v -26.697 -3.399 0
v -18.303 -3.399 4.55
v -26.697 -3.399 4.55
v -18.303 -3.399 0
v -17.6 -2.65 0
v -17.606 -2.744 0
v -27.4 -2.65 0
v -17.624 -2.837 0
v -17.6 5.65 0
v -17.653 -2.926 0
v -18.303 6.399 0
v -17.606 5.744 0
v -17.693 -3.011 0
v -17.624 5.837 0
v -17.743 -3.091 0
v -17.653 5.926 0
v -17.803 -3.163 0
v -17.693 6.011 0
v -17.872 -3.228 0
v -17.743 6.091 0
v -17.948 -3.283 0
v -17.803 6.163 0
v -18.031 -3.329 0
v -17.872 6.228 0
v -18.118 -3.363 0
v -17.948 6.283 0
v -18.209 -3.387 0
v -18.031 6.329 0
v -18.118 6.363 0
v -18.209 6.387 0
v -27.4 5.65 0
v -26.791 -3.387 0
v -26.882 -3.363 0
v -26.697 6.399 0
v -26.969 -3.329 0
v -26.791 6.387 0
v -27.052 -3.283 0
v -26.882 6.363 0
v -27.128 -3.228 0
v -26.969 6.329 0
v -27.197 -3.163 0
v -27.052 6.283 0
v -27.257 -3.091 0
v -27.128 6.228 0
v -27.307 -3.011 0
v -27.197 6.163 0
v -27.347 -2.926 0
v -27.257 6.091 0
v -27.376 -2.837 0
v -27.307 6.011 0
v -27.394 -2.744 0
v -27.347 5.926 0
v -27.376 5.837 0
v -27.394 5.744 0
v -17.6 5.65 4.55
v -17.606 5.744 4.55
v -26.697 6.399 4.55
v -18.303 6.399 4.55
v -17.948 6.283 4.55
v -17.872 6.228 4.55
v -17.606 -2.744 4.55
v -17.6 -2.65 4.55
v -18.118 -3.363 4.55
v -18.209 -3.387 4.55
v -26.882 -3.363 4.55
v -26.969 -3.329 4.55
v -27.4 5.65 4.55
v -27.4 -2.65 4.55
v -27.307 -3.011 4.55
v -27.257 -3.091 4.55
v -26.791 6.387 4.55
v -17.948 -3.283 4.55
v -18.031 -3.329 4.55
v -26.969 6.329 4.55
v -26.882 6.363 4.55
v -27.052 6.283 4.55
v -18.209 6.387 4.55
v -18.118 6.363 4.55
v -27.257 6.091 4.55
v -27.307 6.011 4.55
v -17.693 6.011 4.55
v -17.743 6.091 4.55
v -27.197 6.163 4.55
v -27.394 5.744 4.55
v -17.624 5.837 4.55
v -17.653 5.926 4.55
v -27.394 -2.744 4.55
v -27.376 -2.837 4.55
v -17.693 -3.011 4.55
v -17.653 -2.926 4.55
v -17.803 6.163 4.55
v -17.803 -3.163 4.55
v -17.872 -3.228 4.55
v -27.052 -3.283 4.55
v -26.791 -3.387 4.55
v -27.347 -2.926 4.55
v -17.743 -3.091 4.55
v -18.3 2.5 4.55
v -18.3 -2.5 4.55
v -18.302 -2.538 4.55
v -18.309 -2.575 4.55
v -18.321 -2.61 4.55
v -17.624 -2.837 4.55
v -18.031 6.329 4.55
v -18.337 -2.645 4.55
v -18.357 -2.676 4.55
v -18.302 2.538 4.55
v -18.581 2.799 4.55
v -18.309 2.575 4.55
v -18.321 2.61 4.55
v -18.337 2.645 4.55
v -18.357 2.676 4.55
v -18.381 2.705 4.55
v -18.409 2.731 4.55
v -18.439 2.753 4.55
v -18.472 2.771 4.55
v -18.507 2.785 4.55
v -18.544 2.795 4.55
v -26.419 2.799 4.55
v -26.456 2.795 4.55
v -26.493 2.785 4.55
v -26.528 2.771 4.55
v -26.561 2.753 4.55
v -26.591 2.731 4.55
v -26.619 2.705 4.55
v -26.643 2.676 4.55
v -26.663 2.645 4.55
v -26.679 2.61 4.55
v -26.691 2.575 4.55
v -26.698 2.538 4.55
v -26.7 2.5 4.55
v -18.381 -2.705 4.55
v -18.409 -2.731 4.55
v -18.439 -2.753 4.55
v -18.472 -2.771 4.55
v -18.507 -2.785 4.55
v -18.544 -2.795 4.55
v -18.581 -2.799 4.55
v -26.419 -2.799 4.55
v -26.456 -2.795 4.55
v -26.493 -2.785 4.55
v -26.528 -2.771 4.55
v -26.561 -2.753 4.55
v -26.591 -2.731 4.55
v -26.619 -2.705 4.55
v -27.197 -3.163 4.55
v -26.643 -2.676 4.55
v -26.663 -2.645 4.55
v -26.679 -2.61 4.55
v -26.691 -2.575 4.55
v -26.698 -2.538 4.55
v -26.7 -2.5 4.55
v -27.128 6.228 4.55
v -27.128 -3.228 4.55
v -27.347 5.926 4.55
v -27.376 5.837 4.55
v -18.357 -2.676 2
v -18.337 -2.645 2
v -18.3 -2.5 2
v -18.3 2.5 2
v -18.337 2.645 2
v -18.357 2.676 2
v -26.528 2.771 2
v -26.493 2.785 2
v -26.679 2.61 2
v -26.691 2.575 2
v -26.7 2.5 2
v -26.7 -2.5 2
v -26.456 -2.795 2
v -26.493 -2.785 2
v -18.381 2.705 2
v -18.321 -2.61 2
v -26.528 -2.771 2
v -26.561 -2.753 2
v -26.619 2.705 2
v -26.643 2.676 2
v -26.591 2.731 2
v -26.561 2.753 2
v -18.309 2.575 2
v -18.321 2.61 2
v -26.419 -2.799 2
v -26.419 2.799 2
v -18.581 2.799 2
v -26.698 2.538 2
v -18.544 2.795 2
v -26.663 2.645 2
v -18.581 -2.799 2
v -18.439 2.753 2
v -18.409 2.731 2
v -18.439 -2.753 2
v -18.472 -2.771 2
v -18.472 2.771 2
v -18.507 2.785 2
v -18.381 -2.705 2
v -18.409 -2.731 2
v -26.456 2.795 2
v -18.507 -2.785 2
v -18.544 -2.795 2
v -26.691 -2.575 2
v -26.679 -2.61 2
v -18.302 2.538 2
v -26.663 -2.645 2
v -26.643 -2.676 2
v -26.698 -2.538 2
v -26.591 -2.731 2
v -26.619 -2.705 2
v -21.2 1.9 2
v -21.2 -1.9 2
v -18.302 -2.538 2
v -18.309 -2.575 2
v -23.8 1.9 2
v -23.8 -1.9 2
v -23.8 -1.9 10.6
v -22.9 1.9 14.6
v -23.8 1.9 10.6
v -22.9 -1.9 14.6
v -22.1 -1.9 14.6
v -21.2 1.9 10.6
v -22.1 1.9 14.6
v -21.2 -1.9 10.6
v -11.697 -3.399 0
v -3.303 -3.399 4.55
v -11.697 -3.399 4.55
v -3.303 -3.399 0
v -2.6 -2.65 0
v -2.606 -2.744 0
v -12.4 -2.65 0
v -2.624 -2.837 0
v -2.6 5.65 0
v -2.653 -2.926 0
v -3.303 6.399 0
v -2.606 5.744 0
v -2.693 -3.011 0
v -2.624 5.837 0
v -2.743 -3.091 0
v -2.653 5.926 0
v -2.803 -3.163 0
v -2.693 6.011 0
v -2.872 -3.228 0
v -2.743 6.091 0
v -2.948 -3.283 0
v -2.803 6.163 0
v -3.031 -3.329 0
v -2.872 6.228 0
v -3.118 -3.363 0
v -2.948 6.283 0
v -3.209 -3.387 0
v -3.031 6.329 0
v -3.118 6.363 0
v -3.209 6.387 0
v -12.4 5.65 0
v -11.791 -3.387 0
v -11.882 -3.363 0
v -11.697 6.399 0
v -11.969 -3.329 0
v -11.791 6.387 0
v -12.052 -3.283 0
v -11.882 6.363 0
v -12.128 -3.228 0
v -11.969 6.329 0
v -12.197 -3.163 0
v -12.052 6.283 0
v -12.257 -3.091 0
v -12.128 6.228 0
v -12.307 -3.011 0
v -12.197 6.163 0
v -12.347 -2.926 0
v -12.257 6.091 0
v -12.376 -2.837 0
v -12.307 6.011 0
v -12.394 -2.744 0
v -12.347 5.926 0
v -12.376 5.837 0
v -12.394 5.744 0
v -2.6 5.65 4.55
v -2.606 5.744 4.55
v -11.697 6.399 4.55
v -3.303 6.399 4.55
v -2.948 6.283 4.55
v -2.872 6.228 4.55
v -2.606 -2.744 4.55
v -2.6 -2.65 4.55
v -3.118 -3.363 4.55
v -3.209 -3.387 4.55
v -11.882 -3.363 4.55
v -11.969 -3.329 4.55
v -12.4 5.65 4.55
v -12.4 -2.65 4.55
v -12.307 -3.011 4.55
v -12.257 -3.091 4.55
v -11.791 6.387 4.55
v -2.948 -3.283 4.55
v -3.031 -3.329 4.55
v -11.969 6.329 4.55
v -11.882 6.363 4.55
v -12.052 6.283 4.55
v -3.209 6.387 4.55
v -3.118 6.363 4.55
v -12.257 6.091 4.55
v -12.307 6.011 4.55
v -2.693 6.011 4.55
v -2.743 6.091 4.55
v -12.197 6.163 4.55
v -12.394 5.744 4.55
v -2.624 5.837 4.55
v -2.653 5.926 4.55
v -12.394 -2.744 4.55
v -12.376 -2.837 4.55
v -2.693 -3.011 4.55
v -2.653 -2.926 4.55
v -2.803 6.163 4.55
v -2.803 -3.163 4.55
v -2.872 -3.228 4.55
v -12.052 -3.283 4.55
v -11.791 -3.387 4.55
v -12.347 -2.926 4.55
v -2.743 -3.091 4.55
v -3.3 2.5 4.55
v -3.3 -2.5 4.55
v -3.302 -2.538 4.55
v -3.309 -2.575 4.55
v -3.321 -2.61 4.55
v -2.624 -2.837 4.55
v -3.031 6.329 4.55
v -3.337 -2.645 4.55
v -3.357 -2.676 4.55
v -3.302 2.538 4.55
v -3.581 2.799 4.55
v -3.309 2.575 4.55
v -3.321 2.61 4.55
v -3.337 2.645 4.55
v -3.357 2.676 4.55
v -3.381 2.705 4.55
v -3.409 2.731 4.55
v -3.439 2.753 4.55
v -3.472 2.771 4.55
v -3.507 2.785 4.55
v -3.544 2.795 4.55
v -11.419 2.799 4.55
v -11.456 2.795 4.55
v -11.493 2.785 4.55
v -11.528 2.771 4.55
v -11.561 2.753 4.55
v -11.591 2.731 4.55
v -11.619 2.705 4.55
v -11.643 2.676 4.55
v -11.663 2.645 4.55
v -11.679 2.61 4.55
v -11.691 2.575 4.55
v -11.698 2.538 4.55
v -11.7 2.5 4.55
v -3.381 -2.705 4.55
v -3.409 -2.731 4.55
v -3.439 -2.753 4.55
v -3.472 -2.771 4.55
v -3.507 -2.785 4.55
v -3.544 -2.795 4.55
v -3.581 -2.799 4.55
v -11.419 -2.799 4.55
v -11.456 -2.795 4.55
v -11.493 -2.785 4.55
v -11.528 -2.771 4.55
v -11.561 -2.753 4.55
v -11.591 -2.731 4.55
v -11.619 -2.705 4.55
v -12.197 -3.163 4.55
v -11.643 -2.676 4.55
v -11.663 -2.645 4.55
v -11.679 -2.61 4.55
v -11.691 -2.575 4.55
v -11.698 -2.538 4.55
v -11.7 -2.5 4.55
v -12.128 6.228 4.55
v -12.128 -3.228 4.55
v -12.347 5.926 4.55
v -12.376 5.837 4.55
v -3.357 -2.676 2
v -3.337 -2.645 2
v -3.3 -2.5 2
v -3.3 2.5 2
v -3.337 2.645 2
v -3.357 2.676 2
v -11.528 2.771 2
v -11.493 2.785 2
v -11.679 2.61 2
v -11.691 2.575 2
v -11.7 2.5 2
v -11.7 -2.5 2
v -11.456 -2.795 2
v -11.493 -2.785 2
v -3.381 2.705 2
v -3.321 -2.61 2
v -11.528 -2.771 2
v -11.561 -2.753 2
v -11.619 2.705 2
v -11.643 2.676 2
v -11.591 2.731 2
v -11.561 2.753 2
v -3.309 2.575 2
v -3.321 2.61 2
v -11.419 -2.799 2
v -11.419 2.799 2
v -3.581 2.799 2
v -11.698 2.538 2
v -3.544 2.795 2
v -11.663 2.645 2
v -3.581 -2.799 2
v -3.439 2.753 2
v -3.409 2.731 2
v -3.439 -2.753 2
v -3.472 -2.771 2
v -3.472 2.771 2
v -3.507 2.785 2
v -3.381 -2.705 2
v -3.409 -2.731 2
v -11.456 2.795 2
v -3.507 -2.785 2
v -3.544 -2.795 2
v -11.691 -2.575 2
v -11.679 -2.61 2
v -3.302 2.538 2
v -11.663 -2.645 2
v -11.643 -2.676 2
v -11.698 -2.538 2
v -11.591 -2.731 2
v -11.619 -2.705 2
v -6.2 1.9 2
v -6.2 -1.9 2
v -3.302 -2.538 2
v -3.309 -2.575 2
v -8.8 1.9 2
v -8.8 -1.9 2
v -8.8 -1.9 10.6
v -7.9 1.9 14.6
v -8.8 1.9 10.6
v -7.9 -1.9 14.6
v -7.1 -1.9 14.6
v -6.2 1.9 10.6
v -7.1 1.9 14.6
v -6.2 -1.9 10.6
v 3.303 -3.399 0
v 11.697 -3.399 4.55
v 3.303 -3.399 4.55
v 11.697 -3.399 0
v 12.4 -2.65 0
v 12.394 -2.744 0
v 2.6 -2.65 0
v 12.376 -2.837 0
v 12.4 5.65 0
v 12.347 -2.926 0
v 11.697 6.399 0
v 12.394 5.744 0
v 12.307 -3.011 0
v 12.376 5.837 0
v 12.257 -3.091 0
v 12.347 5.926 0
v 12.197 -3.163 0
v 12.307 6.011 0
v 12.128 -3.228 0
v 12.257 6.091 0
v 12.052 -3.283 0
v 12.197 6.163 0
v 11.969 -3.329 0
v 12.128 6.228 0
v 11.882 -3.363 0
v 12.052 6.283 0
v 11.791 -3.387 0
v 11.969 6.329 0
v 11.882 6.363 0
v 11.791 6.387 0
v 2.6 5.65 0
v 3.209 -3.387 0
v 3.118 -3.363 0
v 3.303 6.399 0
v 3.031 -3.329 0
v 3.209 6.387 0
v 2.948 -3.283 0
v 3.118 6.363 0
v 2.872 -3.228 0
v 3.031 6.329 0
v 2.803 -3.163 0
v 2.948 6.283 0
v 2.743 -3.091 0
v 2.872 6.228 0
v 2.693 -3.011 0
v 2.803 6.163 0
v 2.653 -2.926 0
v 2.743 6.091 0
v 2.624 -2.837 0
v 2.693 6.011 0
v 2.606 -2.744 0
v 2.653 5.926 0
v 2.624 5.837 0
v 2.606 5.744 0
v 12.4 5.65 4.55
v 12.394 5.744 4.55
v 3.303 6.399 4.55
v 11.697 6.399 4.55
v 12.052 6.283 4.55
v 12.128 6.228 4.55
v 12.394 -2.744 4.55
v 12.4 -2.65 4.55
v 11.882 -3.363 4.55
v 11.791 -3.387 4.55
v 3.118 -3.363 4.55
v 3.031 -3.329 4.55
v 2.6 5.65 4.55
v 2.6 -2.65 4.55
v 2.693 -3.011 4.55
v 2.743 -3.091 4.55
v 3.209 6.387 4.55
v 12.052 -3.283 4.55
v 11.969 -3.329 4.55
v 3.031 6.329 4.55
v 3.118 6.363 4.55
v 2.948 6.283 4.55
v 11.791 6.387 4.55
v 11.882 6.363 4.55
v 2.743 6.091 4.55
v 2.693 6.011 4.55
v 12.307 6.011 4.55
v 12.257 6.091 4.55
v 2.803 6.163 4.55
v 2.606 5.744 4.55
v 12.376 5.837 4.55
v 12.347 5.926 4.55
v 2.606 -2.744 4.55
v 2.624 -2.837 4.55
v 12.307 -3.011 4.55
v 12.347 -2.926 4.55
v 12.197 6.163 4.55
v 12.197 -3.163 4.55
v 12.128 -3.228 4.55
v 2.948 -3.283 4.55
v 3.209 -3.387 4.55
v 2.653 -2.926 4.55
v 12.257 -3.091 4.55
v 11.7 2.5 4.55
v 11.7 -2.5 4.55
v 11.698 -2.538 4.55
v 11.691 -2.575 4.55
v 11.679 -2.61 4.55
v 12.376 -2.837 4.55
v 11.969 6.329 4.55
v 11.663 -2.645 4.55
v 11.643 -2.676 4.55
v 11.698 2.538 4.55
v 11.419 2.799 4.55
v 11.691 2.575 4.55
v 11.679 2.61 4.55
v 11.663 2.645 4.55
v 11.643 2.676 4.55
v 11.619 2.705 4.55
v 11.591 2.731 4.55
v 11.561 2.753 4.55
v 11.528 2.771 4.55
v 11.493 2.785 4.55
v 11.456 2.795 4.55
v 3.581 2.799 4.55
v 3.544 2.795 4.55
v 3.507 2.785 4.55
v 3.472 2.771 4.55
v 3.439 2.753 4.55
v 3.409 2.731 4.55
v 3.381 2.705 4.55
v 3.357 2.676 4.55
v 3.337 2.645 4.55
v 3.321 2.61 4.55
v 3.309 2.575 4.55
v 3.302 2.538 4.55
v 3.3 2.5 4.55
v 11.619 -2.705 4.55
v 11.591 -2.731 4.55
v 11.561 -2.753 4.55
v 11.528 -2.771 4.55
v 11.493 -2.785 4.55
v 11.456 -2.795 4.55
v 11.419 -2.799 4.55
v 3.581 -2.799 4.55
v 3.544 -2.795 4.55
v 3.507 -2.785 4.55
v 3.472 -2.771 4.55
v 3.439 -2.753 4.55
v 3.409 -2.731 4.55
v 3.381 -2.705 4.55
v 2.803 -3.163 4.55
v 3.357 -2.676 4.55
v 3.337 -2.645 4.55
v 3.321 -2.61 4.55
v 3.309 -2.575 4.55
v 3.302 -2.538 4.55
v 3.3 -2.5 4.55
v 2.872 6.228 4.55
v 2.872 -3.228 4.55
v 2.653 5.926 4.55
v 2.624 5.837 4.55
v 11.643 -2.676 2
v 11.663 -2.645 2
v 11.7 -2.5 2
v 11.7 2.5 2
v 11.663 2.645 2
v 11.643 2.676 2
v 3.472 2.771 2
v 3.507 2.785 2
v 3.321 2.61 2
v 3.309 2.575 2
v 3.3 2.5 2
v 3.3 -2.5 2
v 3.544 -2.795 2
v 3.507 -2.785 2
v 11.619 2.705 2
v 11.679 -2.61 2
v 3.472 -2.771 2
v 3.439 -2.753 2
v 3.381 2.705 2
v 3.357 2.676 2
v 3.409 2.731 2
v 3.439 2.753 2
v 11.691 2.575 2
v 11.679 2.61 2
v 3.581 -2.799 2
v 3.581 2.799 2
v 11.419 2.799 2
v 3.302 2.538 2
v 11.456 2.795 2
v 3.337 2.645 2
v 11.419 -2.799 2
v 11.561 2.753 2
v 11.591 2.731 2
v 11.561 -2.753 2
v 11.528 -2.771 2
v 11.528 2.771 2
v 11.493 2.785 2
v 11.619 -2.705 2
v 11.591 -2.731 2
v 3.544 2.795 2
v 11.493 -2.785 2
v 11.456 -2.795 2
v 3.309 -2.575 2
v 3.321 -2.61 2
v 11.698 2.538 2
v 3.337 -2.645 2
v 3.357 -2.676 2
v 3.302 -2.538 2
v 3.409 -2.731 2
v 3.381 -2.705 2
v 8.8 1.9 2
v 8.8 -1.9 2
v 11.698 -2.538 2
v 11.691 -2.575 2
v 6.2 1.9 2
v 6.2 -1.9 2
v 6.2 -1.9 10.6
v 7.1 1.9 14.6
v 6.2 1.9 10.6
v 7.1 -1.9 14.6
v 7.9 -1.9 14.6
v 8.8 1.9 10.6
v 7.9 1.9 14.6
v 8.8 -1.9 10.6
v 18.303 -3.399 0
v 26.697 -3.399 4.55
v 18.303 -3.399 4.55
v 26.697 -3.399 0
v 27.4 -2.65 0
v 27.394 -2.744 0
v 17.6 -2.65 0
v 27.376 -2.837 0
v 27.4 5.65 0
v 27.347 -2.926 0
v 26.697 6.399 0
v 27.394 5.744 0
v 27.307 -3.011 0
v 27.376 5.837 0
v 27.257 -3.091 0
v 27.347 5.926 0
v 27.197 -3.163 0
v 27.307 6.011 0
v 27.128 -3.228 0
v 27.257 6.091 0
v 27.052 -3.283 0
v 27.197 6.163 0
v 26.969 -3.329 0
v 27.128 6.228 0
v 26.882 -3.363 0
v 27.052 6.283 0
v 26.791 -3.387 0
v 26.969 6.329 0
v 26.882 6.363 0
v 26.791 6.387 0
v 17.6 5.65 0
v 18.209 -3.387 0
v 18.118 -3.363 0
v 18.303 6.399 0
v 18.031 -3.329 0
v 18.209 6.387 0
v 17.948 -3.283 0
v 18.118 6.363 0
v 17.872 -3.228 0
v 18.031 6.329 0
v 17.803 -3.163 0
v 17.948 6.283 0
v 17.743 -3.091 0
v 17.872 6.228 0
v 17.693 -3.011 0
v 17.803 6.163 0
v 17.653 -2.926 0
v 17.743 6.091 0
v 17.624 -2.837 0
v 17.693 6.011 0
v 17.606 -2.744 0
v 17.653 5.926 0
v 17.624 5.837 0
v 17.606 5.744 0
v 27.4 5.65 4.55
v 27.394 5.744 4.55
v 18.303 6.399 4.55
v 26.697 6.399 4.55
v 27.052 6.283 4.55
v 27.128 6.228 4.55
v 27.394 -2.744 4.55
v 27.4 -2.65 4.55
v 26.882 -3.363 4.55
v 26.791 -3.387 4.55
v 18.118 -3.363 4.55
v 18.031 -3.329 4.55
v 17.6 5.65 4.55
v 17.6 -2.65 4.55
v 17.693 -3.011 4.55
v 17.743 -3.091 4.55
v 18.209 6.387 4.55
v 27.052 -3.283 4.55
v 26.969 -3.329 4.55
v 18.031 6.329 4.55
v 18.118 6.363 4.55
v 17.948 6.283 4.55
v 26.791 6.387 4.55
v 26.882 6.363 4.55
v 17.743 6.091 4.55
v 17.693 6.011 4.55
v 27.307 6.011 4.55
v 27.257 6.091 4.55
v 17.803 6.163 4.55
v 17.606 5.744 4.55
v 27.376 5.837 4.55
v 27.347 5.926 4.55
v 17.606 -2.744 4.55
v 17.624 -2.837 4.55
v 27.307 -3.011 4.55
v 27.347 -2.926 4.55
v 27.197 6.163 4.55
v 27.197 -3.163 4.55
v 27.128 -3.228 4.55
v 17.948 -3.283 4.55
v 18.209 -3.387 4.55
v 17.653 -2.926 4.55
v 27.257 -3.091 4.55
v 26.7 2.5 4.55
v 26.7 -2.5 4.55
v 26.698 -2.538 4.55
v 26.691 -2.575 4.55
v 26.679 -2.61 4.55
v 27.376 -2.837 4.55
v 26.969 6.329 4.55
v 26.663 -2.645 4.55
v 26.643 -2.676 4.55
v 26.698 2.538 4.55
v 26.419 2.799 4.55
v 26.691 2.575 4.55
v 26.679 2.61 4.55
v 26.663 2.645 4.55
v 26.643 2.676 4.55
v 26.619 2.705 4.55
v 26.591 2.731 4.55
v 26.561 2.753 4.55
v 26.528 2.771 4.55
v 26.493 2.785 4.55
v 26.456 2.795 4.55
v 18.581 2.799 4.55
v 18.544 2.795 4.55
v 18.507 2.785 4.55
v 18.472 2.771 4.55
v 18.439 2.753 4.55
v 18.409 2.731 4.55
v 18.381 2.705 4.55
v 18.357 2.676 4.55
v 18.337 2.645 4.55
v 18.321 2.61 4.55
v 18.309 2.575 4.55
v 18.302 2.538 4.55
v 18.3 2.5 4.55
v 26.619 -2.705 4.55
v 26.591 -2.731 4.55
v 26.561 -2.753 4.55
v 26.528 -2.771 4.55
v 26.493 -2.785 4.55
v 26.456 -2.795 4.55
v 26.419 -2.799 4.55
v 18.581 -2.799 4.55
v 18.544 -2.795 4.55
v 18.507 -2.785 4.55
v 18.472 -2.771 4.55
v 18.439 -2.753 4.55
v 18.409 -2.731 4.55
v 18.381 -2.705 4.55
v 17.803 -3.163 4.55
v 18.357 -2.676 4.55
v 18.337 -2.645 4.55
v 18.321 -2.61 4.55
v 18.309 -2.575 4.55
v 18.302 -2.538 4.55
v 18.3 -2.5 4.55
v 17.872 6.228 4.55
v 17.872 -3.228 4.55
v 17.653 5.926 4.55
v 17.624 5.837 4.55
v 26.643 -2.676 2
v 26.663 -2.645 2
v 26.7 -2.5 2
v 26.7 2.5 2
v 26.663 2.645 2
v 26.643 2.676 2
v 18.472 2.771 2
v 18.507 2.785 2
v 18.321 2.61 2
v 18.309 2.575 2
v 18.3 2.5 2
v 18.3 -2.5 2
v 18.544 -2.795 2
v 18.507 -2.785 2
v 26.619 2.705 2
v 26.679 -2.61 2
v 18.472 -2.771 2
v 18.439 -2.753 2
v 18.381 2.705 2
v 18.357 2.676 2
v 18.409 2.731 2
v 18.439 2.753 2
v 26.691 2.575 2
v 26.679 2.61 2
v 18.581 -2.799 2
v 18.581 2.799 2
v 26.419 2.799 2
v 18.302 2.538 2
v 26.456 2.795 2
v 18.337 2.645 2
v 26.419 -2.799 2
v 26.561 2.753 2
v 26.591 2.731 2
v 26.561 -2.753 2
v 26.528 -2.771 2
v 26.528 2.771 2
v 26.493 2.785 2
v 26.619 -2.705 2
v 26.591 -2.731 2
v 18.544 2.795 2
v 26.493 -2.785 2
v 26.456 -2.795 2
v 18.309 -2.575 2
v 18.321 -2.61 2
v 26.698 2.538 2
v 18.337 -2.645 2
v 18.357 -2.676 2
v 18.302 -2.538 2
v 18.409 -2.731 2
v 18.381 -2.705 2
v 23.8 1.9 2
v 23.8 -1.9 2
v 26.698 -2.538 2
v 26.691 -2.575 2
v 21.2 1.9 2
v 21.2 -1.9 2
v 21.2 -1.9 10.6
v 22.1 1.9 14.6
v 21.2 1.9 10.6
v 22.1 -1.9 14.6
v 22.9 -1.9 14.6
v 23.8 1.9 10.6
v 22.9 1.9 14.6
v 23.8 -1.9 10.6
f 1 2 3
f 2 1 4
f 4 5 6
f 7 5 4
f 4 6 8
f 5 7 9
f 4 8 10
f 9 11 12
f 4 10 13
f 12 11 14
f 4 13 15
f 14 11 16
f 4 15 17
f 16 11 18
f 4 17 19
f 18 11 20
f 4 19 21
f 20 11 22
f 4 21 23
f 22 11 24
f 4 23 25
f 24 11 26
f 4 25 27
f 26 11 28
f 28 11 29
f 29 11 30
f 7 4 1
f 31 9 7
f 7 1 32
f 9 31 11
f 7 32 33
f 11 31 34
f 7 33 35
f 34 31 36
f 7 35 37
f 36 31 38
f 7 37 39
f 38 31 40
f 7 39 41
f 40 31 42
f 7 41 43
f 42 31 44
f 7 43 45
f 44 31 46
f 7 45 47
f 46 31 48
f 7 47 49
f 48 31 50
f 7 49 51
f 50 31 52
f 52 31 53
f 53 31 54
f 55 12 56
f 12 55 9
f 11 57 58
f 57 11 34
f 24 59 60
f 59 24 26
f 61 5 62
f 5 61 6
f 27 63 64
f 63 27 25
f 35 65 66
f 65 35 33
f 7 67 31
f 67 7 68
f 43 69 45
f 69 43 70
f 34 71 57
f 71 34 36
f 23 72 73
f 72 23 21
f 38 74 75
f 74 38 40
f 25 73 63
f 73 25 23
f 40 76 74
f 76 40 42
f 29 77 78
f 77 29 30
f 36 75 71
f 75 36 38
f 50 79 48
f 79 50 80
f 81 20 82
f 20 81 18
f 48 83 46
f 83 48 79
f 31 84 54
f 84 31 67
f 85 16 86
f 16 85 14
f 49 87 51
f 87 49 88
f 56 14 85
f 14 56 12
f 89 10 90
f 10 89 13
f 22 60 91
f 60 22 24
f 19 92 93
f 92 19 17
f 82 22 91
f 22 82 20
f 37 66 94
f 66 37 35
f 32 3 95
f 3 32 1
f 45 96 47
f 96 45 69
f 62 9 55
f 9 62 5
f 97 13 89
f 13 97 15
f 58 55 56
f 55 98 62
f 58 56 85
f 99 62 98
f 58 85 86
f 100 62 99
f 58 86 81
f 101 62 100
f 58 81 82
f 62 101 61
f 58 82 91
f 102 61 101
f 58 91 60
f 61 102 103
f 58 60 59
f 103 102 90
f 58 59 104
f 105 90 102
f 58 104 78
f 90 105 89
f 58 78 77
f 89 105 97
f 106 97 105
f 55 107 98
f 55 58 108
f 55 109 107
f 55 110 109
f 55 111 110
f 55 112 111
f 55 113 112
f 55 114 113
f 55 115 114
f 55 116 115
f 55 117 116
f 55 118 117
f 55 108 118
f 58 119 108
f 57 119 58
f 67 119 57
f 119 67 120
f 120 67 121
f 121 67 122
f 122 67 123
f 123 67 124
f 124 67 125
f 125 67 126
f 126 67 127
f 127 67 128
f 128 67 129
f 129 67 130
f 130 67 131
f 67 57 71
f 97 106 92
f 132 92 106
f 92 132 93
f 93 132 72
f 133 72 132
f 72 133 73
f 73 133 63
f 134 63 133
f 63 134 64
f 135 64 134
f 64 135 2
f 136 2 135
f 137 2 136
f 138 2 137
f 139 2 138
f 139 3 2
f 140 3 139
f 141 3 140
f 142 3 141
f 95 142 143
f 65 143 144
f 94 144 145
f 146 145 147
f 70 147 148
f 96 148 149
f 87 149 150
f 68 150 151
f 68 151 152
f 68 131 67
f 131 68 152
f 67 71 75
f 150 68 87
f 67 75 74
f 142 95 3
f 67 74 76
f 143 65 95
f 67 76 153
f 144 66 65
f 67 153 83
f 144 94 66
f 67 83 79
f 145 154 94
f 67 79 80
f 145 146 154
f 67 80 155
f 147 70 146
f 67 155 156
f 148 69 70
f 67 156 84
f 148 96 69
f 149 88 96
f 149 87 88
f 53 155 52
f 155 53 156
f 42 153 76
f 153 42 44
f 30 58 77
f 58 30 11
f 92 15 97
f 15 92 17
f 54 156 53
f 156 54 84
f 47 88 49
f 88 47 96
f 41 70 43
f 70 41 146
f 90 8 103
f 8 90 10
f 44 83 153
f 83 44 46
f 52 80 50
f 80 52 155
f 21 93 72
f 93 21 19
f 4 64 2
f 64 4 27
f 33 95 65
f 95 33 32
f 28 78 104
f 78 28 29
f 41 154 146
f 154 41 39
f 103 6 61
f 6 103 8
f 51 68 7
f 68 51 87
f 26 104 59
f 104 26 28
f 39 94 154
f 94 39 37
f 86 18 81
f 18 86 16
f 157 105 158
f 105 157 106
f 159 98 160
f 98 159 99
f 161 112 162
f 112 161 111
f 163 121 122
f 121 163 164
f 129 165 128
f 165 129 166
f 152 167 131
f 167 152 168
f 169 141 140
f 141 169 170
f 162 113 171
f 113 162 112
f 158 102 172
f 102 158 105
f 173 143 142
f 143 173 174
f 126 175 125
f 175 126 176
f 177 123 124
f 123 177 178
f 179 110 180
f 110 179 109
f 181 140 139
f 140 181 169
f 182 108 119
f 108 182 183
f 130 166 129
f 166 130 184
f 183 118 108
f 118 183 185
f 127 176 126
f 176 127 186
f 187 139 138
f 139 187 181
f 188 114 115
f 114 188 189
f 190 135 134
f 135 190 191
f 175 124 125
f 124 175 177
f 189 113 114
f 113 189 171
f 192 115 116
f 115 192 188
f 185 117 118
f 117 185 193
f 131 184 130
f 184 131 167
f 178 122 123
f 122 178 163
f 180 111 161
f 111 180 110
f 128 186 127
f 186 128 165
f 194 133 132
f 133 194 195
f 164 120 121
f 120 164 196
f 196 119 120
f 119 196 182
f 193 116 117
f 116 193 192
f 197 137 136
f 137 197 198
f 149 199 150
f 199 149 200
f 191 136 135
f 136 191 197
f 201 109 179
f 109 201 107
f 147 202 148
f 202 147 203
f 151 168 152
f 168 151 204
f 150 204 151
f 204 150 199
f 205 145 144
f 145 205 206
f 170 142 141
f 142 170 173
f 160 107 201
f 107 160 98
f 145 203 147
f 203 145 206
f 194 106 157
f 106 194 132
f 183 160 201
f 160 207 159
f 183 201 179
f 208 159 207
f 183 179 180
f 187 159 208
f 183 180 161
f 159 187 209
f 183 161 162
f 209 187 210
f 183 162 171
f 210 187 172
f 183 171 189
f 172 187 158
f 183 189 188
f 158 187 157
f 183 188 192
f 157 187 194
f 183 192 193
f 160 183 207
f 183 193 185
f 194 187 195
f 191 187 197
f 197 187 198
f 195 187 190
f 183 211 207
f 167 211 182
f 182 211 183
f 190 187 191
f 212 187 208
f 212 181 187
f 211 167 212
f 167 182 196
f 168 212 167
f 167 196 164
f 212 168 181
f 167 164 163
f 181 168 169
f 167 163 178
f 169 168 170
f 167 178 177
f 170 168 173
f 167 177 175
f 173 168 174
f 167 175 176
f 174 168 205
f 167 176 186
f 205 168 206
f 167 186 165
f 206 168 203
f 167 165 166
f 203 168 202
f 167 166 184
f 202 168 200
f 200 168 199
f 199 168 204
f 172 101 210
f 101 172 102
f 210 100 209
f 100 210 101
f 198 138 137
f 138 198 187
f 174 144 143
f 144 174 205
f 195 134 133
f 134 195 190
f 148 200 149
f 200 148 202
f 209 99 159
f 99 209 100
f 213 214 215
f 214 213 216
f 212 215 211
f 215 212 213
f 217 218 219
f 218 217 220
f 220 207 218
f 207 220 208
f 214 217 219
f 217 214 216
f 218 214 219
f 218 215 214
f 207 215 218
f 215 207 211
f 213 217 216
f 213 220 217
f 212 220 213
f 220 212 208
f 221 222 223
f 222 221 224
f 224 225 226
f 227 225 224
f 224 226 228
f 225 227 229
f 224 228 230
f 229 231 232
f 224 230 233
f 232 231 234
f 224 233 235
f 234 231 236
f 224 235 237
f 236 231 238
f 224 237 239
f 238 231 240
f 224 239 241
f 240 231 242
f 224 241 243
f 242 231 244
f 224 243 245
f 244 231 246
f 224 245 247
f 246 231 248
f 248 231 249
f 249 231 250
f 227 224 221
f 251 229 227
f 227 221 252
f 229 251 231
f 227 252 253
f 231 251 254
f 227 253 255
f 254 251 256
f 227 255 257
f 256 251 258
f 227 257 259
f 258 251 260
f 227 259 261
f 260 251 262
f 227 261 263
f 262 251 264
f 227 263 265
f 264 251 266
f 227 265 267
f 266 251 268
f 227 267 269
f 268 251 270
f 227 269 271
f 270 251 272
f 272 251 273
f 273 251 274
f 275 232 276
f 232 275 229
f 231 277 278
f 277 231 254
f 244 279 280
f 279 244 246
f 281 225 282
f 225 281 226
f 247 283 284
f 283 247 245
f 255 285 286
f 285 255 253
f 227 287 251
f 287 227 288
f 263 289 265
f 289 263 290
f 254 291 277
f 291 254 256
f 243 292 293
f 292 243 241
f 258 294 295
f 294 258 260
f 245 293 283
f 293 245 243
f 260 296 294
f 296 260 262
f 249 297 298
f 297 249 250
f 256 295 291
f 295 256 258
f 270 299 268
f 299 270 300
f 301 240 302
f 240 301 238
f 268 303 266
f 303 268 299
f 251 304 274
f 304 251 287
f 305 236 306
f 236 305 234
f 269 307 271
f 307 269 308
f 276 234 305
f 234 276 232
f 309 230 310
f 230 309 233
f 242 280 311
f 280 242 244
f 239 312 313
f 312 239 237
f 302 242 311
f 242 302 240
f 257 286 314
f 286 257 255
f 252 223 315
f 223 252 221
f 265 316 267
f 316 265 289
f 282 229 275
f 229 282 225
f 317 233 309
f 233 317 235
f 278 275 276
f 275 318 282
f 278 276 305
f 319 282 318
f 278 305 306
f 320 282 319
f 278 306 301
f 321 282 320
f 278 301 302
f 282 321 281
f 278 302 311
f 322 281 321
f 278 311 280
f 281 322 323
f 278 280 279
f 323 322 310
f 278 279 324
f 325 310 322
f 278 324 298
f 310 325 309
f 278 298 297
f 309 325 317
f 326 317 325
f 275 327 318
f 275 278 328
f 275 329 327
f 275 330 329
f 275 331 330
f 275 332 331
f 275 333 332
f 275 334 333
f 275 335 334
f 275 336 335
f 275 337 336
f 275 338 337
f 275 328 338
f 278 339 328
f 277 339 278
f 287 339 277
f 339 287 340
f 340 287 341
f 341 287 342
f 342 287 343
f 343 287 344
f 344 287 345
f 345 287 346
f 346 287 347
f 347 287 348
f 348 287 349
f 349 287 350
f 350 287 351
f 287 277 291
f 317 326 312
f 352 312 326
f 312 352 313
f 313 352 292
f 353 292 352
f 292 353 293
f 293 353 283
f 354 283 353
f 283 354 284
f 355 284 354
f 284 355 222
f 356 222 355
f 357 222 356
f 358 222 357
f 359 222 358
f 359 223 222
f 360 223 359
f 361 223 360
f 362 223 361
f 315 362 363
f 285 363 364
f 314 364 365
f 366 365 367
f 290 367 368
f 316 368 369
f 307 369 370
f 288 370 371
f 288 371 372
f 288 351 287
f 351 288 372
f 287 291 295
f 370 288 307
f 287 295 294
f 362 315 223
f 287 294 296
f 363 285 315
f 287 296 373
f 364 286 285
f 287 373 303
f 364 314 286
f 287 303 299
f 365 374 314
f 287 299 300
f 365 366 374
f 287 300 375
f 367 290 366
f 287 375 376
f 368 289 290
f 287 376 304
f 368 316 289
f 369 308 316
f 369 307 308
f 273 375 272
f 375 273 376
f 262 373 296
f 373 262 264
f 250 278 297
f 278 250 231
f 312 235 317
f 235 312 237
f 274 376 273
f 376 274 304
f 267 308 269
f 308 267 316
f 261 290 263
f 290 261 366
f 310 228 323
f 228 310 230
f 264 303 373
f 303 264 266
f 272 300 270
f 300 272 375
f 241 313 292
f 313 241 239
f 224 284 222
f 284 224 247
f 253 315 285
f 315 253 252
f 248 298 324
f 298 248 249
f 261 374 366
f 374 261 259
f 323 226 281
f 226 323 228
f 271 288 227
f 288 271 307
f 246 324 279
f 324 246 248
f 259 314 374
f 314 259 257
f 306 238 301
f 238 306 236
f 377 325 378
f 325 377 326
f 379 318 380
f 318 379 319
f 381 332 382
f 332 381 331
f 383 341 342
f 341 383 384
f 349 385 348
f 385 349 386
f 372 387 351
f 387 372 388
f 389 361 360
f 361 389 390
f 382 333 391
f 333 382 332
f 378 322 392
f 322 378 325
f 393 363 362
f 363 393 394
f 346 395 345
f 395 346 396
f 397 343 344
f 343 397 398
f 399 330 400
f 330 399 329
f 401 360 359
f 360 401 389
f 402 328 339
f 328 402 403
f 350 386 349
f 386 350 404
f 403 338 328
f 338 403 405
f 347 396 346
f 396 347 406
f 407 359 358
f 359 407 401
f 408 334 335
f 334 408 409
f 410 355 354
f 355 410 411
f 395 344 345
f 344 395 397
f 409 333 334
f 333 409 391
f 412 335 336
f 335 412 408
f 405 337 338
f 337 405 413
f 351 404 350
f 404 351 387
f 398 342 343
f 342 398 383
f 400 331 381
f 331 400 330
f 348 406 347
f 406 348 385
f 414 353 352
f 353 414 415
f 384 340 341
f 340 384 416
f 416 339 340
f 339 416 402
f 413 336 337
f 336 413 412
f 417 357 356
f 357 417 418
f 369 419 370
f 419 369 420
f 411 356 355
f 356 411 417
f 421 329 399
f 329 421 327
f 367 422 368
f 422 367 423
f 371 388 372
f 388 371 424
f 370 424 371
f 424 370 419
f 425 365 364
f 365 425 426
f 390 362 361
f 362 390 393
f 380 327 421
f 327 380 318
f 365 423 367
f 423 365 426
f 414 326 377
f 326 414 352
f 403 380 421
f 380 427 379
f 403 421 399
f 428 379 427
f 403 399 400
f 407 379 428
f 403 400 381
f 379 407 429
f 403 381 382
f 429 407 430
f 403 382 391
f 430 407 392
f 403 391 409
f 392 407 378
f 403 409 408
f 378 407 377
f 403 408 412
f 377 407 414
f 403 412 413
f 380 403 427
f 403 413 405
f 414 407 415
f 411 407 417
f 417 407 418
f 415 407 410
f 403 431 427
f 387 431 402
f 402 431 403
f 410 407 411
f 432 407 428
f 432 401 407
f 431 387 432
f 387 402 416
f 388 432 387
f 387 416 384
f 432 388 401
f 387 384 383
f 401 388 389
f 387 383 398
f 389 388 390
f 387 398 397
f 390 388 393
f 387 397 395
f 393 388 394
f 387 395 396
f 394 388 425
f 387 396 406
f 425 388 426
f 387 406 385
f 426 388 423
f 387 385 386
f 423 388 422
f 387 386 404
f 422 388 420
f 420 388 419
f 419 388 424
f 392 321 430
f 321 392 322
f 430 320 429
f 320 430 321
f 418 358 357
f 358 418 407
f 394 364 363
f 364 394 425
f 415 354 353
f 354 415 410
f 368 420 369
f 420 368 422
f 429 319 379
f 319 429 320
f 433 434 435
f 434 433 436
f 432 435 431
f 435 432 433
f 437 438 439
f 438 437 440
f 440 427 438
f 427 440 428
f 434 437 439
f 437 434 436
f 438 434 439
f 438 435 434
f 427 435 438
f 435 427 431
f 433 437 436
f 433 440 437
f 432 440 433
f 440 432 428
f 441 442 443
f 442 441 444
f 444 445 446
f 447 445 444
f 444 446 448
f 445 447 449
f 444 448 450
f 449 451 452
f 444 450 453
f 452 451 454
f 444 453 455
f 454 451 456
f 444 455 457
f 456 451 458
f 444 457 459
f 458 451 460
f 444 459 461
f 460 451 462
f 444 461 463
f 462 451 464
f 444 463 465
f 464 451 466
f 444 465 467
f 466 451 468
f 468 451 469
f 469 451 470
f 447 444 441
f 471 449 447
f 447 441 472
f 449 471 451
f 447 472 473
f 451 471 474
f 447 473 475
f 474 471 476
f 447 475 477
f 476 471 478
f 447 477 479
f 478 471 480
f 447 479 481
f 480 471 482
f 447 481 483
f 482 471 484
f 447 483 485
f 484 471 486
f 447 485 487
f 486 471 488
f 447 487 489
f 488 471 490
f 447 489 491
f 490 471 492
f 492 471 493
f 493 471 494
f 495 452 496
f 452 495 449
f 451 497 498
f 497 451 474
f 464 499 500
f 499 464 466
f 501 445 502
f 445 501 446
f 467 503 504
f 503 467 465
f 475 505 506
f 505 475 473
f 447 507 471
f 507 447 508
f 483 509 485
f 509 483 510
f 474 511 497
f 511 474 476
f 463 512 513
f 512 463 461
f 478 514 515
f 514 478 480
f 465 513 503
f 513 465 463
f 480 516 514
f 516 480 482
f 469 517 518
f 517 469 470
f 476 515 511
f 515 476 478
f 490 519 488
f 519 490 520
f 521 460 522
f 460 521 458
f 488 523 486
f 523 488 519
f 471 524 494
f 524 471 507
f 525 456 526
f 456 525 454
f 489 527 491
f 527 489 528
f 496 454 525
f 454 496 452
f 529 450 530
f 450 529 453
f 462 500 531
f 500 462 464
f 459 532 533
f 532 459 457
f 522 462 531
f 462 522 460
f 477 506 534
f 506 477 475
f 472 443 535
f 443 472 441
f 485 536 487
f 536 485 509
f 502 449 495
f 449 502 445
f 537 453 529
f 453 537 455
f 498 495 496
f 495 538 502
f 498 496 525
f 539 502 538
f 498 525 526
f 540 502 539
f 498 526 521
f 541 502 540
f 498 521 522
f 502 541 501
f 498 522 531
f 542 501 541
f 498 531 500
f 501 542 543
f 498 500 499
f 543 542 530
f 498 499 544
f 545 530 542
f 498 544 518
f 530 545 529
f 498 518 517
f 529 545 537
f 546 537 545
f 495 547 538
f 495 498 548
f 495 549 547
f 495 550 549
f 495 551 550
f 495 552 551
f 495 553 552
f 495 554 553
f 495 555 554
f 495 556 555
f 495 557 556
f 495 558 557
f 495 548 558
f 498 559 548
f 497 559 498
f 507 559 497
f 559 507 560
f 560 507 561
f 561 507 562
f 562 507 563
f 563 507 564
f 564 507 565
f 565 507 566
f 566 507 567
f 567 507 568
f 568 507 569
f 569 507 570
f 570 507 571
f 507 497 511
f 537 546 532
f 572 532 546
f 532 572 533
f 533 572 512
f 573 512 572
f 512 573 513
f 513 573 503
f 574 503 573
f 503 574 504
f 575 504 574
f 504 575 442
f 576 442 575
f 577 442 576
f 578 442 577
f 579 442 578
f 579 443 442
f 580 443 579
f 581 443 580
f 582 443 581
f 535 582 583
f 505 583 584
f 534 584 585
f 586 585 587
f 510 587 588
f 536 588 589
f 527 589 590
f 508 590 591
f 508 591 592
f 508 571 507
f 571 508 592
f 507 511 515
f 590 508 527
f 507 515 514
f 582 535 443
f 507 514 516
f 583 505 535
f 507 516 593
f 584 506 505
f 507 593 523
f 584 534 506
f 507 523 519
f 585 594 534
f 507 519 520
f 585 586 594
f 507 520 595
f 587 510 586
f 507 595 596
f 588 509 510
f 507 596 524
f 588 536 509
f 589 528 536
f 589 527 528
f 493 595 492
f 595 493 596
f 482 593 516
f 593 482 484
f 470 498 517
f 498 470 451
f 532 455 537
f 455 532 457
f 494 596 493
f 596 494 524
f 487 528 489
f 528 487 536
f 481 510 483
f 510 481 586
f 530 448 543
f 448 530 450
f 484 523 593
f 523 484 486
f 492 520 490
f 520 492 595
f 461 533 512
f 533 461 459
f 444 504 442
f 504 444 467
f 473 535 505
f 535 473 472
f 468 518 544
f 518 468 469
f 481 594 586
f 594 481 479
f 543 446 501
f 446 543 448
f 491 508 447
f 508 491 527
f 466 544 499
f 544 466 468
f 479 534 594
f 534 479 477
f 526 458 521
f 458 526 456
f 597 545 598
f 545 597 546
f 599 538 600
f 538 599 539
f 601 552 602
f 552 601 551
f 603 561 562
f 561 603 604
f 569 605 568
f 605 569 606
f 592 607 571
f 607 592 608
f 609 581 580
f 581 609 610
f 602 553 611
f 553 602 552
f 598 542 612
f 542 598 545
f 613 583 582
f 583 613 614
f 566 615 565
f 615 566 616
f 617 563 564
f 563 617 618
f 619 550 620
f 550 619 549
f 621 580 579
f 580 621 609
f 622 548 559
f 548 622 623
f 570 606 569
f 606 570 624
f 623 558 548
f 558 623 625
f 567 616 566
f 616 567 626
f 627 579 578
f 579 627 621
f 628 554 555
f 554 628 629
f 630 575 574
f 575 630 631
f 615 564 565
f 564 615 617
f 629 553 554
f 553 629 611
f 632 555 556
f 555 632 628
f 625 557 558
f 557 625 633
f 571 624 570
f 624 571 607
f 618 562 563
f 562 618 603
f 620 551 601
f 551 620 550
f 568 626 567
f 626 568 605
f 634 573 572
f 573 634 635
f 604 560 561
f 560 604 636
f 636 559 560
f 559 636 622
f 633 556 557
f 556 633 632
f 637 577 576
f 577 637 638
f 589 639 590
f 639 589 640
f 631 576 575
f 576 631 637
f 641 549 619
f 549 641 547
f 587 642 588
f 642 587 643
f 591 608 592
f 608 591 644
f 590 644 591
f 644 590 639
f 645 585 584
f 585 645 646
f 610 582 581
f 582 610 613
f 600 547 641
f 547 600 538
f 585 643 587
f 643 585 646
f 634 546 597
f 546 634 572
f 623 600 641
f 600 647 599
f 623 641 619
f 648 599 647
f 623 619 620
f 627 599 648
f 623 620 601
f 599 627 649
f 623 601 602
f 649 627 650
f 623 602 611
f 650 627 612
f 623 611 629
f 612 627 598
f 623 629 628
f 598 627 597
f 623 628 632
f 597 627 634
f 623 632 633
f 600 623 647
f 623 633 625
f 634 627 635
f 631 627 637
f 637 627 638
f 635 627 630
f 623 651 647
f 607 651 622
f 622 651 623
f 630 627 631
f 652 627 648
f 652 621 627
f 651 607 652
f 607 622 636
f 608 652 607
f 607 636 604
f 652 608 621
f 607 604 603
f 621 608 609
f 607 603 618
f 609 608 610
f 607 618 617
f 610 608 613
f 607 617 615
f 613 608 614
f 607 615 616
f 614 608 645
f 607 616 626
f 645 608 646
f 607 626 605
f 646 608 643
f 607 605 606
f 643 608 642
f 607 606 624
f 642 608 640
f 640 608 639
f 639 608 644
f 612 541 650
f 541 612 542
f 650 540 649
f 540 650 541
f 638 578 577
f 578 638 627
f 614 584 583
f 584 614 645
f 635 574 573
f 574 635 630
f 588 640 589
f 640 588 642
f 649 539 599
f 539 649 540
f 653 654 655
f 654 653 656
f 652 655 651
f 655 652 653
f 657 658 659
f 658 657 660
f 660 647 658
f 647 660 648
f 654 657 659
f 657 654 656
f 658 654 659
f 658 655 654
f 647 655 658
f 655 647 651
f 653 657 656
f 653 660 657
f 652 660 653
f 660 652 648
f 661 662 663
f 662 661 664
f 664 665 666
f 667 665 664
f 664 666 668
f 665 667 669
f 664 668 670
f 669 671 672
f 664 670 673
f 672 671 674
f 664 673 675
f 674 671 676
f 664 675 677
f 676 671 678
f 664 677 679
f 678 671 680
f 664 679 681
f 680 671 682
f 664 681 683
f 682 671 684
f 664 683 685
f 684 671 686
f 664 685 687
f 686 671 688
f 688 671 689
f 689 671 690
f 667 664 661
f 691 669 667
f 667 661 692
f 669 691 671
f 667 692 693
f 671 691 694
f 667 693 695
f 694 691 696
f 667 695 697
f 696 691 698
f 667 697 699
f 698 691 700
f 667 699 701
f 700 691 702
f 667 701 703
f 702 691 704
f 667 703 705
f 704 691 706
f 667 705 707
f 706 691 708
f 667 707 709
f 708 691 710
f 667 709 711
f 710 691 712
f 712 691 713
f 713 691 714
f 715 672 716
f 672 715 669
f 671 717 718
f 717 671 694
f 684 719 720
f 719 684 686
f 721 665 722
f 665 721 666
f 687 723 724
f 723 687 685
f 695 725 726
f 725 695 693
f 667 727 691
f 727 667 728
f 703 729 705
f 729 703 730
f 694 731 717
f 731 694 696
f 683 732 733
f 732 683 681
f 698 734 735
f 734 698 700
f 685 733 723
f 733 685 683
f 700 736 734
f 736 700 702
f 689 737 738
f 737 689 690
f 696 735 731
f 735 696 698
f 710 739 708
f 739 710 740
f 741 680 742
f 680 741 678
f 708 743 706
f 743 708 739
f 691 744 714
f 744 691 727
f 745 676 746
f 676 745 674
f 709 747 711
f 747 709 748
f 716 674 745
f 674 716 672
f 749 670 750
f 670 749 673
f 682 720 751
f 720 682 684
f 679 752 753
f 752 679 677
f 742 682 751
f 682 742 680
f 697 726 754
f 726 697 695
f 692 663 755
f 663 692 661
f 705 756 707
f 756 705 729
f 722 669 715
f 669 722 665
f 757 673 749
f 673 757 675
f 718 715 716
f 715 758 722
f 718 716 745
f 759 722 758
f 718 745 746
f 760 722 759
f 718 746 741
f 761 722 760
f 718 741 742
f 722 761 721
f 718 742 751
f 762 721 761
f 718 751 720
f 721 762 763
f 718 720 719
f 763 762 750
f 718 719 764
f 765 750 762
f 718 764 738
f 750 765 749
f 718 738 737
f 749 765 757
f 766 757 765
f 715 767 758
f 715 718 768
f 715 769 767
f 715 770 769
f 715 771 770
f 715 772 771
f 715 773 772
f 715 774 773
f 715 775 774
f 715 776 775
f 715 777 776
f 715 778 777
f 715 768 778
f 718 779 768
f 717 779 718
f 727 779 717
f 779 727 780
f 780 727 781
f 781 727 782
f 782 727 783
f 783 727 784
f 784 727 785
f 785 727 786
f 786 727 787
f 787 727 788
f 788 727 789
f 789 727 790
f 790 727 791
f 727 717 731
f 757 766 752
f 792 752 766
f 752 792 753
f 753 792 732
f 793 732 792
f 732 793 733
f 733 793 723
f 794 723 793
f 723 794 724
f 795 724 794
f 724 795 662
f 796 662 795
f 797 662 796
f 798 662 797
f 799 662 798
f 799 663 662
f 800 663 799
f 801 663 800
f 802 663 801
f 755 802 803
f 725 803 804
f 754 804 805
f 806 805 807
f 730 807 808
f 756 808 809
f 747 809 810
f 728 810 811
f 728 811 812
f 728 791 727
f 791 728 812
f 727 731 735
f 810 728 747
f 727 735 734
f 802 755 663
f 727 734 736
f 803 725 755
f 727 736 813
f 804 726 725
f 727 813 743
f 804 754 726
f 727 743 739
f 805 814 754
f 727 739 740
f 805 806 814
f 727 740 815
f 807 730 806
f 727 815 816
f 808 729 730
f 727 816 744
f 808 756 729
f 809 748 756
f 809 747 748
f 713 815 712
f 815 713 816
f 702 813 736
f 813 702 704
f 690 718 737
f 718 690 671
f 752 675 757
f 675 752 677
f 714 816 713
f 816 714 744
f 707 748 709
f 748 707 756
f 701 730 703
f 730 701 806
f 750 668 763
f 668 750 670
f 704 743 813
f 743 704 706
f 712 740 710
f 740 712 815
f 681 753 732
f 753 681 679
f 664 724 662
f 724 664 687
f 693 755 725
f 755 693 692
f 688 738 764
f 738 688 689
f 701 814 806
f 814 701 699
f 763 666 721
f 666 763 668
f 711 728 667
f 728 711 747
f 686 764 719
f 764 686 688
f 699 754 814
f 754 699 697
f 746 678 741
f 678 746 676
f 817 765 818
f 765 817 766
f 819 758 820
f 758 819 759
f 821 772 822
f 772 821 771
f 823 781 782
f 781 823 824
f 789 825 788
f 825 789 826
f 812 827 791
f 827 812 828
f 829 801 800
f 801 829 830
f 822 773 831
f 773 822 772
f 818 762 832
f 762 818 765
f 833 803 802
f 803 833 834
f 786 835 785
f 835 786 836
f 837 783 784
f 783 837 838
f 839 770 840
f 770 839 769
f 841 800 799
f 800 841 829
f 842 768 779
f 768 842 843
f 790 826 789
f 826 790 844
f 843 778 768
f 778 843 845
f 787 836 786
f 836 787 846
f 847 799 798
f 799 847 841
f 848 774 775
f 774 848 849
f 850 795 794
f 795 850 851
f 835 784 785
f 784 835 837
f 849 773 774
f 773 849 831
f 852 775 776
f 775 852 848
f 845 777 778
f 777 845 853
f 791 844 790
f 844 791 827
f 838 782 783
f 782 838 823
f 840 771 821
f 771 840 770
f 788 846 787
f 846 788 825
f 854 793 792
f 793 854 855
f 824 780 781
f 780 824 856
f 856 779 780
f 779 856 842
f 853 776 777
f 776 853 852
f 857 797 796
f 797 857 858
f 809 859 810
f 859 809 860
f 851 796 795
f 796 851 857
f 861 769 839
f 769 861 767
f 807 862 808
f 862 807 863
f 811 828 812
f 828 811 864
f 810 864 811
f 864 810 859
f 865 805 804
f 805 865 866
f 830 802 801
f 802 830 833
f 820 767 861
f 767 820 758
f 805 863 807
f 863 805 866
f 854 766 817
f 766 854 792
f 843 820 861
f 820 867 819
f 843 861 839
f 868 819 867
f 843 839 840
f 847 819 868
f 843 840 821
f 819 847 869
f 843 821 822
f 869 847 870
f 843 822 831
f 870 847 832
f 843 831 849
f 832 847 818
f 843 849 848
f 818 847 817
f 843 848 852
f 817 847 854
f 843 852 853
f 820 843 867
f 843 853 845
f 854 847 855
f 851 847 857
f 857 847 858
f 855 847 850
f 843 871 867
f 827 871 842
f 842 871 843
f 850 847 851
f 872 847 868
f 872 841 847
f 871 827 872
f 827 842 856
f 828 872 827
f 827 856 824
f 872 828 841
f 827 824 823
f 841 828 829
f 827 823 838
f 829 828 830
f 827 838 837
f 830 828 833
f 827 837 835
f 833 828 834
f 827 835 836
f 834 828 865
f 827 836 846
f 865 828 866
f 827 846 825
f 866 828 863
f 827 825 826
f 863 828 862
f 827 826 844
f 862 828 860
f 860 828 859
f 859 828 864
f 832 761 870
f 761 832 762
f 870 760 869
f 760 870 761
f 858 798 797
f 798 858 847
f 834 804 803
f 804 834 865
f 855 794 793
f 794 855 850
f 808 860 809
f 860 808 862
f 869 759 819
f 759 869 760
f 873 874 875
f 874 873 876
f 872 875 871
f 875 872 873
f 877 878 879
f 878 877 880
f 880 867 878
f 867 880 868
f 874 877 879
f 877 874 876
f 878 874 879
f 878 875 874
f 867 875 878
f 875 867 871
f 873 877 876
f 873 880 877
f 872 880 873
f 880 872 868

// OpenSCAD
$fn = 50;

difference() {
	union() {
		translate(v = [-22.5, 0, 0]) {
			rotate(a = [0, 0, 0]) {
				difference() {
					union() {
						translate(v = [0, 0, 0]) {
							rotate(a = [0, 0, 0]) {
								difference() {
									union() {
										translate(v = [0, 0, 0]) {
											rotate(a = [0, 0, 0]) {
												difference() {
													union() {
														translate(v = [0, 1.5, 0]) {
															hull() {
																translate(v = [-4.15, 4.15, 0]) {
																	cylinder(h = 4.55, r = 0.75);
																}
																translate(v = [4.15, 4.15, 0]) {
																	cylinder(h = 4.55, r = 0.75);
																}
																translate(v = [-4.15, -4.15, 0]) {
																	cylinder(h = 4.55, r = 0.75);
																}
																translate(v = [4.15, -4.15, 0]) {
																	cylinder(h = 4.55, r = 0.75);
																}
															}
														}
													}
													union() {
														translate(v = [0, 0, 2.0]) {
															hull() {
																translate(v = [-3.9000000000000004, 2.5, 0]) {
																	cylinder(h = 2.65, r = 0.3);
																}
																translate(v = [3.9000000000000004, 2.5, 0]) {
																	cylinder(h = 2.65, r = 0.3);
																}
																translate(v = [-3.9000000000000004, -2.5, 0]) {
																	cylinder(h = 2.65, r = 0.3);
																}
																translate(v = [3.9000000000000004, -2.5, 0]) {
																	cylinder(h = 2.65, r = 0.3);
																}
															}
														}
													}
												}
											}
										}
										translate(v = [0, 0, 0]) {
											rotate(a = [0, 0, 0]) {
												difference() {
													union() {
														translate(v = [-1.4000000000000001, -1.9, 1.95]) {
															cube(size = [2.8000000000000003, 3.8, 12.65]);
														}
													}
													union() {
														translate(v = [0, 2.0, 0]) {
															rotate(a = [90, 0, 0]) {
																linear_extrude(height = 4.0) {
																	polygon(points = [[-1.3, 1.85], [-1.3, 10.6], [-0.4, 14.6], [-0.4, 14.799999999999999], [-1.6, 14.799999999999999], [-1.6, 1.85]]);
																}
															}
														}
														translate(v = [0, 2.0, 0]) {
															rotate(a = [90, 0, 0]) {
																linear_extrude(height = 4.0) {
																	polygon(points = [[1.3, 1.85], [1.3, 10.6], [0.4, 14.6], [0.4, 14.799999999999999], [1.6, 14.799999999999999], [1.6, 1.85]]);
																}
															}
														}
													}
												}
											}
										}
									}
									union();
								}
							}
						}
					}
					union();
				}
			}
		}
		translate(v = [-7.5, 0, 0]) {
			rotate(a = [0, 0, 0]) {
				difference() {
					union() {
						translate(v = [0, 0, 0]) {
							rotate(a = [0, 0, 0]) {
								difference() {
									union() {
										translate(v = [0, 0, 0]) {
											rotate(a = [0, 0, 0]) {
												difference() {
													union() {
														translate(v = [0, 1.5, 0]) {
															hull() {
																translate(v = [-4.15, 4.15, 0]) {
																	cylinder(h = 4.55, r = 0.75);
																}
																translate(v = [4.15, 4.15, 0]) {
																	cylinder(h = 4.55, r = 0.75);
																}
																translate(v = [-4.15, -4.15, 0]) {
																	cylinder(h = 4.55, r = 0.75);
																}
																translate(v = [4.15, -4.15, 0]) {
																	cylinder(h = 4.55, r = 0.75);
																}
															}
														}
													}
													union() {
														translate(v = [0, 0, 2.0]) {
															hull() {
																translate(v = [-3.9000000000000004, 2.5, 0]) {
																	cylinder(h = 2.65, r = 0.3);
																}
																translate(v = [3.9000000000000004, 2.5, 0]) {
																	cylinder(h = 2.65, r = 0.3);
																}
																translate(v = [-3.9000000000000004, -2.5, 0]) {
																	cylinder(h = 2.65, r = 0.3);
																}
																translate(v = [3.9000000000000004, -2.5, 0]) {
																	cylinder(h = 2.65, r = 0.3);
																}
															}
														}
													}
												}
											}
										}
										translate(v = [0, 0, 0]) {
											rotate(a = [0, 0, 0]) {
												difference() {
													union() {
														translate(v = [-1.4000000000000001, -1.9, 1.95]) {
															cube(size = [2.8000000000000003, 3.8, 12.65]);
														}
													}
													union() {
														translate(v = [0, 2.0, 0]) {
															rotate(a = [90, 0, 0]) {
																linear_extrude(height = 4.0) {
																	polygon(points = [[-1.3, 1.85], [-1.3, 10.6], [-0.4, 14.6], [-0.4, 14.799999999999999], [-1.6, 14.799999999999999], [-1.6, 1.85]]);
																}
															}
														}
														translate(v = [0, 2.0, 0]) {
															rotate(a = [90, 0, 0]) {
																linear_extrude(height = 4.0) {
																	polygon(points = [[1.3, 1.85], [1.3, 10.6], [0.4, 14.6], [0.4, 14.799999999999999], [1.6, 14.799999999999999], [1.6, 1.85]]);
																}
															}
														}
													}
												}
											}
										}
									}
									union();
								}
							}
						}
					}
					union();
				}
			}
		}
		translate(v = [7.5, 0, 0]) {
			rotate(a = [0, 0, 0]) {
				difference() {
					union() {
						translate(v = [0, 0, 0]) {
							rotate(a = [0, 0, 0]) {
								difference() {
									union() {
										translate(v = [0, 0, 0]) {
											rotate(a = [0, 0, 0]) {
												difference() {
													union() {
														translate(v = [0, 1.5, 0]) {
															hull() {
																translate(v = [-4.15, 4.15, 0]) {
																	cylinder(h = 4.55, r = 0.75);
																}
																translate(v = [4.15, 4.15, 0]) {
																	cylinder(h = 4.55, r = 0.75);
																}
																translate(v = [-4.15, -4.15, 0]) {
																	cylinder(h = 4.55, r = 0.75);
																}
																translate(v = [4.15, -4.15, 0]) {
																	cylinder(h = 4.55, r = 0.75);
																}
															}
														}
													}
													union() {
														translate(v = [0, 0, 2.0]) {
															hull() {
																translate(v = [-3.9000000000000004, 2.5, 0]) {
																	cylinder(h = 2.65, r = 0.3);
																}
																translate(v = [3.9000000000000004, 2.5, 0]) {
																	cylinder(h = 2.65, r = 0.3);
																}
																translate(v = [-3.9000000000000004, -2.5, 0]) {
																	cylinder(h = 2.65, r = 0.3);
																}
																translate(v = [3.9000000000000004, -2.5, 0]) {
																	cylinder(h = 2.65, r = 0.3);
																}
															}
														}
													}
												}
											}
										}
										translate(v = [0, 0, 0]) {
											rotate(a = [0, 0, 0]) {
												difference() {
													union() {
														translate(v = [-1.4000000000000001, -1.9, 1.95]) {
															cube(size = [2.8000000000000003, 3.8, 12.65]);
														}
													}
													union() {
														translate(v = [0, 2.0, 0]) {
															rotate(a = [90, 0, 0]) {
																linear_extrude(height = 4.0) {
																	polygon(points = [[-1.3, 1.85], [-1.3, 10.6], [-0.4, 14.6], [-0.4, 14.799999999999999], [-1.6, 14.799999999999999], [-1.6, 1.85]]);
																}
															}
														}
														translate(v = [0, 2.0, 0]) {
															rotate(a = [90, 0, 0]) {
																linear_extrude(height = 4.0) {
																	polygon(points = [[1.3, 1.85], [1.3, 10.6], [0.4, 14.6], [0.4, 14.799999999999999], [1.6, 14.799999999999999], [1.6, 1.85]]);
																}
															}
														}
													}
												}
											}
										}
									}
									union();
								}
							}
						}
					}
					union();
				}
			}
		}
		translate(v = [22.5, 0, 0]) {
			rotate(a = [0, 0, 0]) {
				difference() {
					union() {
						translate(v = [0, 0, 0]) {
							rotate(a = [0, 0, 0]) {
								difference() {
									union() {
										translate(v = [0, 0, 0]) {
											rotate(a = [0, 0, 0]) {
												difference() {
													union() {
														translate(v = [0, 1.5, 0]) {
															hull() {
																translate(v = [-4.15, 4.15, 0]) {
																	cylinder(h = 4.55, r = 0.75);
																}
																translate(v = [4.15, 4.15, 0]) {
																	cylinder(h = 4.55, r = 0.75);
																}
																translate(v = [-4.15, -4.15, 0]) {
																	cylinder(h = 4.55, r = 0.75);
																}
																translate(v = [4.15, -4.15, 0]) {
																	cylinder(h = 4.55, r = 0.75);
																}
															}
														}
													}
													union() {
														translate(v = [0, 0, 2.0]) {
															hull() {
																translate(v = [-3.9000000000000004, 2.5, 0]) {
																	cylinder(h = 2.65, r = 0.3);
																}
																translate(v = [3.9000000000000004, 2.5, 0]) {
																	cylinder(h = 2.65, r = 0.3);
																}
																translate(v = [-3.9000000000000004, -2.5, 0]) {
																	cylinder(h = 2.65, r = 0.3);
																}
																translate(v = [3.9000000000000004, -2.5, 0]) {
																	cylinder(h = 2.65, r = 0.3);
																}
															}
														}
													}
												}
											}
										}
										translate(v = [0, 0, 0]) {
											rotate(a = [0, 0, 0]) {
												difference() {
													union() {
														translate(v = [-1.4000000000000001, -1.9, 1.95]) {
															cube(size = [2.8000000000000003, 3.8, 12.65]);
														}
													}
													union() {
														translate(v = [0, 2.0, 0]) {
															rotate(a = [90, 0, 0]) {
																linear_extrude(height = 4.0) {
																	polygon(points = [[-1.3, 1.85], [-1.3, 10.6], [-0.4, 14.6], [-0.4, 14.799999999999999], [-1.6, 14.799999999999999], [-1.6, 1.85]]);
																}
															}
														}
														translate(v = [0, 2.0, 0]) {
															rotate(a = [90, 0, 0]) {
																linear_extrude(height = 4.0) {
																	polygon(points = [[1.3, 1.85], [1.3, 10.6], [0.4, 14.6], [0.4, 14.799999999999999], [1.6, 14.799999999999999], [1.6, 1.85]]);
																}
															}
														}
													}
												}
											}
										}
									}
									union();
								}
							}
						}
					}
					union();
				}
			}
		}
	}
	union();
}
